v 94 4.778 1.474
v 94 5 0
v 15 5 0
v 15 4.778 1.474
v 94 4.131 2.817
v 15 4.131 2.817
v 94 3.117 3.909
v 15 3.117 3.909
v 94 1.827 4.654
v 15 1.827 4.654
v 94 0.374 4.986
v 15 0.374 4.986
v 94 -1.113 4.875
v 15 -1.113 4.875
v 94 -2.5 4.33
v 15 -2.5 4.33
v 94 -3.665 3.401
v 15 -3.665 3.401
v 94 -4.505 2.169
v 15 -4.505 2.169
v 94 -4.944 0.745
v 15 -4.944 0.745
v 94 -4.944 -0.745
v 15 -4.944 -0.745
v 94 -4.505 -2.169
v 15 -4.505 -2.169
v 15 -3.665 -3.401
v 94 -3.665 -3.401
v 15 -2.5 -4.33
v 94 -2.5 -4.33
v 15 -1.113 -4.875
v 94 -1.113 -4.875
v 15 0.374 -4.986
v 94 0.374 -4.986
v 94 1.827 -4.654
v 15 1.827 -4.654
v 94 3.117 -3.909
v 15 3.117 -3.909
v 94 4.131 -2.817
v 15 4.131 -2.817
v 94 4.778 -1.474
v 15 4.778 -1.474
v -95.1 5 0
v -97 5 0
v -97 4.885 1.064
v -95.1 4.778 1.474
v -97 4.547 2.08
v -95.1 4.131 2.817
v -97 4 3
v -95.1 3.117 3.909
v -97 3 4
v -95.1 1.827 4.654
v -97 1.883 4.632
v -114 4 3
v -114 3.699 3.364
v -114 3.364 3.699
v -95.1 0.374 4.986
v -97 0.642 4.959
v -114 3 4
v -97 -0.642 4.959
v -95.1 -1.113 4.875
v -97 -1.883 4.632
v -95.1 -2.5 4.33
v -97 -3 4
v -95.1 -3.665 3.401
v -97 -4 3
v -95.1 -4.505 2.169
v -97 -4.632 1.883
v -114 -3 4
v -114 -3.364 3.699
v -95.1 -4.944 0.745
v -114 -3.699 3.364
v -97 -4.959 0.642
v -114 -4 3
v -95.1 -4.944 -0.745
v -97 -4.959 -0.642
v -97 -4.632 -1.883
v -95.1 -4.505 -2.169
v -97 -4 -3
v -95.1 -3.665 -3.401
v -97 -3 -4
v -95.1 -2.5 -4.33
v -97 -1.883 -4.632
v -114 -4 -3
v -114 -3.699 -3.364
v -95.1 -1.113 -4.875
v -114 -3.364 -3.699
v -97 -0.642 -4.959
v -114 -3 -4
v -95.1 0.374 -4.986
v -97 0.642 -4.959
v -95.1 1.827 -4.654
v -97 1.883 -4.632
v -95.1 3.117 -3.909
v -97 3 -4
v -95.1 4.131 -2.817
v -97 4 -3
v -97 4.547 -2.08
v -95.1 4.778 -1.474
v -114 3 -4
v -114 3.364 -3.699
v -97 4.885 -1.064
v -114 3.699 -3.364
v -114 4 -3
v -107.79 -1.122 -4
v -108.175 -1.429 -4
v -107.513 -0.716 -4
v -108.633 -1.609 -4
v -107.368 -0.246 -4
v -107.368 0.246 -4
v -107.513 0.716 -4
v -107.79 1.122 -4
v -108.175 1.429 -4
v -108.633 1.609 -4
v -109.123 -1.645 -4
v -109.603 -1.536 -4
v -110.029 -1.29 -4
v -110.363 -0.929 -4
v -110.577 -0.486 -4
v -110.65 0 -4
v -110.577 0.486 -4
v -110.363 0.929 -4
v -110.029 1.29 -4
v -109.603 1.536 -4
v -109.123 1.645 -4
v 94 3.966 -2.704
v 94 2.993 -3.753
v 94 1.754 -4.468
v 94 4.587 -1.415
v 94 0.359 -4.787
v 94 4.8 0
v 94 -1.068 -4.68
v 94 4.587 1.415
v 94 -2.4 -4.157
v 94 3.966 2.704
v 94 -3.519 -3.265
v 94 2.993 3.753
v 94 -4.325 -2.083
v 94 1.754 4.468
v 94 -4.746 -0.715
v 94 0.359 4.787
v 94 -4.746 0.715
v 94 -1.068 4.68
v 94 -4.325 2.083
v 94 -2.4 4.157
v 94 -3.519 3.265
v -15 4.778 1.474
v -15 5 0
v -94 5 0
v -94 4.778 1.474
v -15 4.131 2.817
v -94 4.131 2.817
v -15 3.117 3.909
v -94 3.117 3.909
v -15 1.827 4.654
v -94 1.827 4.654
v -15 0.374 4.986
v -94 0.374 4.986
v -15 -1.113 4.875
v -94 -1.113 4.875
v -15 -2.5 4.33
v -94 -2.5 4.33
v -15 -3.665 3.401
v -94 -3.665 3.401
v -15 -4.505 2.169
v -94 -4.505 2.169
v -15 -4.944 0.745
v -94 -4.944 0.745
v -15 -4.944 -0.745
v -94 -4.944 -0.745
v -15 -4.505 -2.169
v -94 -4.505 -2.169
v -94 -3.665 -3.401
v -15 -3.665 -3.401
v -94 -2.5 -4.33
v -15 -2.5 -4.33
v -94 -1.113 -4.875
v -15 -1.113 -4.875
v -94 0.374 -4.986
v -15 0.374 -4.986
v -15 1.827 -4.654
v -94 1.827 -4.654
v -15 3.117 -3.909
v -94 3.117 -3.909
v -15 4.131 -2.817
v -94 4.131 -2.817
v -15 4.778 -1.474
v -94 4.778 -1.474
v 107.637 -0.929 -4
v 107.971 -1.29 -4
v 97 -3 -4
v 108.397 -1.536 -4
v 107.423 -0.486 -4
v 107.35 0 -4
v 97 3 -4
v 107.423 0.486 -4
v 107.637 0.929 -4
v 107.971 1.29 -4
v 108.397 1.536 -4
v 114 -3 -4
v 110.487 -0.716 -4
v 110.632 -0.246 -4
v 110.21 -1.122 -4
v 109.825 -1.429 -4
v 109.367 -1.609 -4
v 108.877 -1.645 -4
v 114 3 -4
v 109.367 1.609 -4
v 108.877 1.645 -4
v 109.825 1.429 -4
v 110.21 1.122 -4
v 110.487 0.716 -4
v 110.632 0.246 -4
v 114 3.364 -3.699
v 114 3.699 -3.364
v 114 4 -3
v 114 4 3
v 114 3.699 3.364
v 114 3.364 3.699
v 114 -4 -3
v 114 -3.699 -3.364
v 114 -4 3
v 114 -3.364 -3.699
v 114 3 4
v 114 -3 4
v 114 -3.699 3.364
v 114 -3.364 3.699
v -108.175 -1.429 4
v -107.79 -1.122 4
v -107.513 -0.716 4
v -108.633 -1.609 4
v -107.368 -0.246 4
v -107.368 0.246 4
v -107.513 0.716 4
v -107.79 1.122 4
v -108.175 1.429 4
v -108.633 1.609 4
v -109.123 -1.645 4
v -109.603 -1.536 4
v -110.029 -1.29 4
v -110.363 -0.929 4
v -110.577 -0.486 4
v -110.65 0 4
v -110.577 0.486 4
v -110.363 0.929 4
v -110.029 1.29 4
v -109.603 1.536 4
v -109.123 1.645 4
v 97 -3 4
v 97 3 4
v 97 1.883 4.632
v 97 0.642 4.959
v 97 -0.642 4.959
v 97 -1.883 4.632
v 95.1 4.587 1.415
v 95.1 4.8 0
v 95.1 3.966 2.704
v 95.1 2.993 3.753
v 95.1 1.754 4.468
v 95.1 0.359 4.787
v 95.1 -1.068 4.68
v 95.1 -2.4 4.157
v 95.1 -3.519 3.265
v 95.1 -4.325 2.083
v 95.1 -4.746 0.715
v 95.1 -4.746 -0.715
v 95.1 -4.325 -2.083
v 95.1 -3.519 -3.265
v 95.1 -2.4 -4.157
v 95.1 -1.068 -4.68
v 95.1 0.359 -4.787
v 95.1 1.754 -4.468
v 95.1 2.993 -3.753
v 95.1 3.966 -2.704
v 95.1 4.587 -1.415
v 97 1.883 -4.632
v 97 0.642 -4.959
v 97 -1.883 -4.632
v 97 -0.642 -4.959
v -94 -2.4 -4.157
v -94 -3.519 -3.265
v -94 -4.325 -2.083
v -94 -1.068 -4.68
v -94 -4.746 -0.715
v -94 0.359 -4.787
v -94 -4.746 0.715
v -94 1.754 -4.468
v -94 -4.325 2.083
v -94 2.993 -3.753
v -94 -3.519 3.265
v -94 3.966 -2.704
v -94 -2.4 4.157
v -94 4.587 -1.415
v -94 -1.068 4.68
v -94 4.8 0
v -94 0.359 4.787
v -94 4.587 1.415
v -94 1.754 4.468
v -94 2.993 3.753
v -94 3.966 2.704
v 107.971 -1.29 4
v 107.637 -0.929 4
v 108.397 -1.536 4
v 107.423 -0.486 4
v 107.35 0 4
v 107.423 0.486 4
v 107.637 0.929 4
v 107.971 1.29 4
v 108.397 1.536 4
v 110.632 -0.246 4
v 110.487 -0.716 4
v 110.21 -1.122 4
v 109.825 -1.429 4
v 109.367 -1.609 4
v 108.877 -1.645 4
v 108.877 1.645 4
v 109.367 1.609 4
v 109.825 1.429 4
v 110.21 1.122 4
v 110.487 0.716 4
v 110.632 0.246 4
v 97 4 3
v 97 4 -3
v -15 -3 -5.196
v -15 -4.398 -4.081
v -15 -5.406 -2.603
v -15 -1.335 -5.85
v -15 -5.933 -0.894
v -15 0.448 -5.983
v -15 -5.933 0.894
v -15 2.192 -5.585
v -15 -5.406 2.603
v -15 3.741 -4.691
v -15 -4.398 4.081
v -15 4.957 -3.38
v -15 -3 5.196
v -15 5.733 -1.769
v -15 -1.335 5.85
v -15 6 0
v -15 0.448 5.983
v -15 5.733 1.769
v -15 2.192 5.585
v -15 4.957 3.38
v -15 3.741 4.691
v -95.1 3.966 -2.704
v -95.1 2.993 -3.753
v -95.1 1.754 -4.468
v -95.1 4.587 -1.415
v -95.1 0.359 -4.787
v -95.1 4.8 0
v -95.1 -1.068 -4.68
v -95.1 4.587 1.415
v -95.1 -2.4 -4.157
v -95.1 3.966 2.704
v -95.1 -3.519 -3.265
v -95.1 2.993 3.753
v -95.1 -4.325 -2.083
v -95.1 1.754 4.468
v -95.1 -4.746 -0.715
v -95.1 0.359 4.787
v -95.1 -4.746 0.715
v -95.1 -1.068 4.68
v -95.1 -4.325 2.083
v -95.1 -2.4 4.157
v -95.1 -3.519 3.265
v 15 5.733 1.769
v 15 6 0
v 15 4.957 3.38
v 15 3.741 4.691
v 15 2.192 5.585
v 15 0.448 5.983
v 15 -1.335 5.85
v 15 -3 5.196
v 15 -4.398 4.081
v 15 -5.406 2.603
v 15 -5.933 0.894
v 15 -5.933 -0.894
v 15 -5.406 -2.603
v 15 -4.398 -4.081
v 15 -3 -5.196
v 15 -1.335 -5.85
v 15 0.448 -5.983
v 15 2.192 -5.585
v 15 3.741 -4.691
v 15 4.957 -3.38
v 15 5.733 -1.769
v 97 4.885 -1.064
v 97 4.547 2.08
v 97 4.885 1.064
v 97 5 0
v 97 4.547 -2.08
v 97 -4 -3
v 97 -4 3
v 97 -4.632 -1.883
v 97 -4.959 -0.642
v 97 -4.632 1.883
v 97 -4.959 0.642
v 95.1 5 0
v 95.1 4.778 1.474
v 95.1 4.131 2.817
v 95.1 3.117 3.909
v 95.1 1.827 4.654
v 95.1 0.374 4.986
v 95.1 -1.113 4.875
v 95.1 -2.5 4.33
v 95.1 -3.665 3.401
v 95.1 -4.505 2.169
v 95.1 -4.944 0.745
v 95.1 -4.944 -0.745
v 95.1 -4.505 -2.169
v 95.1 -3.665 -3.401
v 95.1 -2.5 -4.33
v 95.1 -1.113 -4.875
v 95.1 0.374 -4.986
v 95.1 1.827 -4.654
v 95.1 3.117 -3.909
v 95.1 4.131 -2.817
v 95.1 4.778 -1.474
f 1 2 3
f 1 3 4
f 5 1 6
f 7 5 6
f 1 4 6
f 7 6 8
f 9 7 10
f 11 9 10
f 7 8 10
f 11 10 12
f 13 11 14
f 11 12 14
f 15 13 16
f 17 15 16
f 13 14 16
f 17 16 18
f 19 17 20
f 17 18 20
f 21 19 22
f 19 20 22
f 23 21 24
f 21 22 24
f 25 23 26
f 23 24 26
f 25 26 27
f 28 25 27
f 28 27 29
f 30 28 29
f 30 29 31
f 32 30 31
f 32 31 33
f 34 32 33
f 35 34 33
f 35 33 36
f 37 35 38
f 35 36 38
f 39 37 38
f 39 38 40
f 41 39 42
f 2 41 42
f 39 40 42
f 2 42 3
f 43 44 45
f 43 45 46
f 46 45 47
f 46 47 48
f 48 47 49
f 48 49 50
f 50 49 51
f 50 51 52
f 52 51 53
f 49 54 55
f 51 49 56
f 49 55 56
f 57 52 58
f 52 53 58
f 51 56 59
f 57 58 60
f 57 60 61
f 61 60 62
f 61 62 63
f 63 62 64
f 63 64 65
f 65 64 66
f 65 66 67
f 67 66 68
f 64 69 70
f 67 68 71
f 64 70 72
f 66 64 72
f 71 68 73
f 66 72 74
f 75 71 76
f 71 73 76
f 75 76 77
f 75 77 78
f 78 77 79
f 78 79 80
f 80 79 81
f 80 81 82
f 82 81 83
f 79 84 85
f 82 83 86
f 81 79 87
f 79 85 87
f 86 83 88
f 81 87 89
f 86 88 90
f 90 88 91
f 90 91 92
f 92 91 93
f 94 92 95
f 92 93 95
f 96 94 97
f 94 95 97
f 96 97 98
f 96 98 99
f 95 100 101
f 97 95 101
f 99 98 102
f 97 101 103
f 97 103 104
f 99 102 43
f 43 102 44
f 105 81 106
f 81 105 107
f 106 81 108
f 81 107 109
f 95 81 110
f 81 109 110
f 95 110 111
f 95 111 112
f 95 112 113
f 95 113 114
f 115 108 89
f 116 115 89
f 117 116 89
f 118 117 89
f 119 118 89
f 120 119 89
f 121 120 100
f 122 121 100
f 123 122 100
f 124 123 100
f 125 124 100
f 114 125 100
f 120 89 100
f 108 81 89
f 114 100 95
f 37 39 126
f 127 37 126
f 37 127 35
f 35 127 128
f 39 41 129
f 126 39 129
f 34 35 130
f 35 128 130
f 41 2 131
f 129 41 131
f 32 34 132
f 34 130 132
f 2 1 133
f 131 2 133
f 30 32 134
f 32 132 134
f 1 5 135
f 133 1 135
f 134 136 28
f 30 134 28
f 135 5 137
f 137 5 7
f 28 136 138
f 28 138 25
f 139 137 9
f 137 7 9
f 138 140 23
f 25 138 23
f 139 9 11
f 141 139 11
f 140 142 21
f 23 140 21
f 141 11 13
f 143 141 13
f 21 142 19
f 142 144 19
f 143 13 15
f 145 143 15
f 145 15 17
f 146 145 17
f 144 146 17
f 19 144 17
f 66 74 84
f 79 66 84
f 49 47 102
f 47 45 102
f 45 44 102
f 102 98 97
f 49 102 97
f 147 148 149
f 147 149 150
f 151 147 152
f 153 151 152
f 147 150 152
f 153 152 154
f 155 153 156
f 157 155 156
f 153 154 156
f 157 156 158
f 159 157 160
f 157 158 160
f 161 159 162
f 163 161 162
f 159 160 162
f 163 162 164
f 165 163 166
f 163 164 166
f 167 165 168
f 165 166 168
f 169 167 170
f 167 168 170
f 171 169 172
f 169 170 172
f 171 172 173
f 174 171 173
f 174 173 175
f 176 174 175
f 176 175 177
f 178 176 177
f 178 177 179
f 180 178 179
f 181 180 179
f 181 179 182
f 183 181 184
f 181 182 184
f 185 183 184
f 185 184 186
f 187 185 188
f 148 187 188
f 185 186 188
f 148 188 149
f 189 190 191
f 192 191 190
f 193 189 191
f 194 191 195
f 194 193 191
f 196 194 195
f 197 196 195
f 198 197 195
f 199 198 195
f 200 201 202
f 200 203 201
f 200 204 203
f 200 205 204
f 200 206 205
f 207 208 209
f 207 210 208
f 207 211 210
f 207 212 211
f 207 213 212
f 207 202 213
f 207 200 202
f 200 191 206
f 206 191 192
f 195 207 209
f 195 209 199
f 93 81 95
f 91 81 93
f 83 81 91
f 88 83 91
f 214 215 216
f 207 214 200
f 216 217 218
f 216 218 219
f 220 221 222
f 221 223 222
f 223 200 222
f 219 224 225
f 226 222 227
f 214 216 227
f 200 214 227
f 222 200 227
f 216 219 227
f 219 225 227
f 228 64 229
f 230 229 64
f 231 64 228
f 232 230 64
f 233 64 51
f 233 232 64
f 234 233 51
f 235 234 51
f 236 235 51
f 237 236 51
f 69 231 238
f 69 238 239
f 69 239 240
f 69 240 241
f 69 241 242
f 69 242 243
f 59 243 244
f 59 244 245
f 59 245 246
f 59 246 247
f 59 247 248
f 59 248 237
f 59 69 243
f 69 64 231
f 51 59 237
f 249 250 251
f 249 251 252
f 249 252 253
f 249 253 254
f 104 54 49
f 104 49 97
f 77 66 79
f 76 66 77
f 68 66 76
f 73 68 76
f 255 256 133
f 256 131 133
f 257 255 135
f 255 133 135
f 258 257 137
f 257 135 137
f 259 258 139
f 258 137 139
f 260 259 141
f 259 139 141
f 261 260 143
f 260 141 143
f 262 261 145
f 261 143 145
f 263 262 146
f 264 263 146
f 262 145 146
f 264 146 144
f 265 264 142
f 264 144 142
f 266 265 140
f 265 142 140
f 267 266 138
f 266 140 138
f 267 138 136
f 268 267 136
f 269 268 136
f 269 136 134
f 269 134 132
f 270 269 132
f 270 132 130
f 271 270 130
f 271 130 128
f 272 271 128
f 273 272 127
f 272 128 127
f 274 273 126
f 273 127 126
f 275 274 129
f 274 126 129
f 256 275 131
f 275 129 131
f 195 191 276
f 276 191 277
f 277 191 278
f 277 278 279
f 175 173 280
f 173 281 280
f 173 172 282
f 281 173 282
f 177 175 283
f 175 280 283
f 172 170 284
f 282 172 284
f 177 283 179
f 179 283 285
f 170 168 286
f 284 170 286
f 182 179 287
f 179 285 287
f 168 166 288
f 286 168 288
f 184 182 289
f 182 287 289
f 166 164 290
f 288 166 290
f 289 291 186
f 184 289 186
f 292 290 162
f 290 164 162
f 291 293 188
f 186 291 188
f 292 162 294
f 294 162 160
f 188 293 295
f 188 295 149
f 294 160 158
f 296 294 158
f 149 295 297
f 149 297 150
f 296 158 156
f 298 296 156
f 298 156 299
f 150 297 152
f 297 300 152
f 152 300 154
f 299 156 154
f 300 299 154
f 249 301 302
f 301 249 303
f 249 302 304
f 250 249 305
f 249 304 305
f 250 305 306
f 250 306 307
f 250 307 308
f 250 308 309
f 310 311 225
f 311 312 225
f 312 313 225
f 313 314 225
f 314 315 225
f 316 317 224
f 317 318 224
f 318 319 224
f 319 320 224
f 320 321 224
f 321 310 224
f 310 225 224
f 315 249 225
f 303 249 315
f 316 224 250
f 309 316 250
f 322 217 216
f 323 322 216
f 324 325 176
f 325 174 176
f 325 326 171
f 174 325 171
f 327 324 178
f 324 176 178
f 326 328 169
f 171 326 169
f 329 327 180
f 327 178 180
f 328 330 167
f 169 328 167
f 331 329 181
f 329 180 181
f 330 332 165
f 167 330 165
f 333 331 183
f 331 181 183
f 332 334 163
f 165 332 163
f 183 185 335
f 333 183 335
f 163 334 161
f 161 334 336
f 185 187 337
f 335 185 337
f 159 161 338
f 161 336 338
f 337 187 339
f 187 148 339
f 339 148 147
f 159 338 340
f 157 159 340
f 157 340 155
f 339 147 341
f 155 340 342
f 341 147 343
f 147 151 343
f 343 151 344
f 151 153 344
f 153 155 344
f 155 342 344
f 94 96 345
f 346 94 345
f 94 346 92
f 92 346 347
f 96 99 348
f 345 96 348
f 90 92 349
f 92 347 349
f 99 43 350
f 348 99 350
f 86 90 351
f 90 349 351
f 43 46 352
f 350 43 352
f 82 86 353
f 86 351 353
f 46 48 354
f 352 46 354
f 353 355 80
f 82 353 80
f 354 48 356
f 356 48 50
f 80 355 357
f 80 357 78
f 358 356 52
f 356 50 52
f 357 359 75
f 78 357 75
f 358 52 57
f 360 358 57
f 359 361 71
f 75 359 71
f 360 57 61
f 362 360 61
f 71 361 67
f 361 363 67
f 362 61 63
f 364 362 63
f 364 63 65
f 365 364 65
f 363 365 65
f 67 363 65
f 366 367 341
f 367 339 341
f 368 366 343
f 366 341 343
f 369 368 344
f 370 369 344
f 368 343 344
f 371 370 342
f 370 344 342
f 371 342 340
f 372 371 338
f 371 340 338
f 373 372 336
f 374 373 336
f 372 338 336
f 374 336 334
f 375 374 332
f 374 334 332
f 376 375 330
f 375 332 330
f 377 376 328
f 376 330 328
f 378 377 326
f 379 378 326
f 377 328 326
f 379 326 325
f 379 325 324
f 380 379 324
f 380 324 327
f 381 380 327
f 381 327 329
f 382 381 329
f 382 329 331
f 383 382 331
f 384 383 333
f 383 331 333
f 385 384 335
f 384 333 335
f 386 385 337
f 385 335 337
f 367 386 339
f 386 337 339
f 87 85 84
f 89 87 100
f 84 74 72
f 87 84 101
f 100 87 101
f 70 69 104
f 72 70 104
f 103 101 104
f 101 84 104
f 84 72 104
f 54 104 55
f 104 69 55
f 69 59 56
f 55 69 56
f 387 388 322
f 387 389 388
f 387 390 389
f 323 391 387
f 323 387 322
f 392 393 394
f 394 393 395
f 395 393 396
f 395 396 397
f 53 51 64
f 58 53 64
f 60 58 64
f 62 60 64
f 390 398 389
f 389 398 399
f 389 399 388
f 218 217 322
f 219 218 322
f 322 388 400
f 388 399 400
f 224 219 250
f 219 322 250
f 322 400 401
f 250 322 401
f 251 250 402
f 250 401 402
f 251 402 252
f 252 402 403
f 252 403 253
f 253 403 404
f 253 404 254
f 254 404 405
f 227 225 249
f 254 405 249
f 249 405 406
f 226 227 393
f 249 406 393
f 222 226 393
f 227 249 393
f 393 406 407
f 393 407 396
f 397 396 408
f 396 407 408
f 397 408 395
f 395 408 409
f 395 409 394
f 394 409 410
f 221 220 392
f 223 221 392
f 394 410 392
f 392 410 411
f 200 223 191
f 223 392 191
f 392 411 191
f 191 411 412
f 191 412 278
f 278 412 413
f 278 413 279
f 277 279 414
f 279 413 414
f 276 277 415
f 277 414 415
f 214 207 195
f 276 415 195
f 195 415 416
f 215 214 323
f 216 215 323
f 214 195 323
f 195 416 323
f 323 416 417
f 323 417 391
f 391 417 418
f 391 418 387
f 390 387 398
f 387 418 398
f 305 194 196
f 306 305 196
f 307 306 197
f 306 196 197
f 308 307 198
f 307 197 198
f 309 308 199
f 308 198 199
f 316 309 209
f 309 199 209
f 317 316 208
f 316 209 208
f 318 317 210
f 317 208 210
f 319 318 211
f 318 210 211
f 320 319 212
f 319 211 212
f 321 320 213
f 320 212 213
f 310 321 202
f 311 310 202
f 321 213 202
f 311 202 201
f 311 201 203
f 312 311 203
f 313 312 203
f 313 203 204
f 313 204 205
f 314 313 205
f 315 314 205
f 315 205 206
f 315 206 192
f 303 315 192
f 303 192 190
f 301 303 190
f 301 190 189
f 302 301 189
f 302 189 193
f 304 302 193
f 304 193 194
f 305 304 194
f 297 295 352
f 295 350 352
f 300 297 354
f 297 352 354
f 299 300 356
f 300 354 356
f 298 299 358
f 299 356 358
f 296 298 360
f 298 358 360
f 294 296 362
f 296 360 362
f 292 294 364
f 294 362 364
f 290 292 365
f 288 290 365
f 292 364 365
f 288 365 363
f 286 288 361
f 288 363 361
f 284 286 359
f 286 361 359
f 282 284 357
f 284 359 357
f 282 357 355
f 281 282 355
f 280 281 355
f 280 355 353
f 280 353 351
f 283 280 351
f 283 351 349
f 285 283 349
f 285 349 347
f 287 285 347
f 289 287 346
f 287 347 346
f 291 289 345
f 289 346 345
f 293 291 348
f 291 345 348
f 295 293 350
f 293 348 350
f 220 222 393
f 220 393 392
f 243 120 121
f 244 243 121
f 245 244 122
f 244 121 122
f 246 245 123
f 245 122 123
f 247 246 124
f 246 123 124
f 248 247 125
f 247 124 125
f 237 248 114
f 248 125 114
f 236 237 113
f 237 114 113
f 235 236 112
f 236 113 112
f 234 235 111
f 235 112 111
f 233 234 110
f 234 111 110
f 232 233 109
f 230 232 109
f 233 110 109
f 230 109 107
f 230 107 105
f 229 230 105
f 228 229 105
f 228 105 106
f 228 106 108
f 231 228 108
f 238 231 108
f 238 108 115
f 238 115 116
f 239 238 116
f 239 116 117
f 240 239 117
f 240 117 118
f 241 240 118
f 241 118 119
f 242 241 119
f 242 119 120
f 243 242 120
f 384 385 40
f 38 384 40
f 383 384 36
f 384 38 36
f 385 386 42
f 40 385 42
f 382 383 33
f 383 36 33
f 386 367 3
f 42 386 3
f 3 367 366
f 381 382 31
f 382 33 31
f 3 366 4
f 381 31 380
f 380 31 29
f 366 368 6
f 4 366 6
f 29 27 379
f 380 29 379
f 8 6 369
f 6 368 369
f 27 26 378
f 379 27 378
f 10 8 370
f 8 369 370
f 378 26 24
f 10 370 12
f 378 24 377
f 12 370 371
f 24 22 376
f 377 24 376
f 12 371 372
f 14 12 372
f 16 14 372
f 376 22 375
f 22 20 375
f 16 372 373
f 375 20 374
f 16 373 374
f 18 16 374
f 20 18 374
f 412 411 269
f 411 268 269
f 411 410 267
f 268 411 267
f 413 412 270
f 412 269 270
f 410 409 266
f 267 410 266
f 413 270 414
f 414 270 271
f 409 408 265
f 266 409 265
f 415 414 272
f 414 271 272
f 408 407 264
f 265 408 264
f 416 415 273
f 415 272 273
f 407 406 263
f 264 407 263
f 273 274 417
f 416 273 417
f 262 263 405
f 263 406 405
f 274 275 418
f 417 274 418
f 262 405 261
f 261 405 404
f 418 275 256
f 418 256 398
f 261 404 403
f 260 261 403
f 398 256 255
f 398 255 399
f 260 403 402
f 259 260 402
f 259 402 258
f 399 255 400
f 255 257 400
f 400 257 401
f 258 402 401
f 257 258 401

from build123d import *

# Parameters (mm, degrees)
SKETCH_2_OUTSIDE_W   = 59.726
SKETCH_2_OUTSIDE_H   = 59.726
SKETCH_2_OUTSIDE_W_2 = 8
SKETCH_2_OUTSIDE_H_2 = 8
CUT_EXTRUDE_1_DEPTH  = 17
HOLE_WIZARD_M4_1_D   = 3.3


with BuildPart() as part:
    # 草图1 → 旋转1 (revolve)
    with BuildSketch(Plane.XY):
        Polygon((114, 0), (114, 5), (95.1, 5), (95.1, 4.8), (94, 4.8), (94, 5), (15, 5), (15, 6), (-15, 6), (-15, 5), (-94, 5), (-94, 4.8), (-95.1, 4.8), (-95.1, 5), (-114, 5), (-114, 0), align=None)
    revolve(axis=Axis((-114, 0, 0), (1, 0, 0)))

    # 草图2 outside → 切除-拉伸1 (cut)
    with BuildSketch(Plane(origin=(114, 0, 0), x_dir=(0, 0, -1), z_dir=(1, 0, 0))):
        Rectangle(SKETCH_2_OUTSIDE_W, SKETCH_2_OUTSIDE_H)
        Rectangle(SKETCH_2_OUTSIDE_W_2, SKETCH_2_OUTSIDE_H_2, mode=Mode.SUBTRACT)
    cut_extrude_1 = extrude(amount=-CUT_EXTRUDE_1_DEPTH, mode=Mode.SUBTRACT)

    # 镜向2: 切除-拉伸1 across plane
    add(cut_extrude_1.mirror(Plane(origin=(0, 0, 0), x_dir=(0, 0, 1), z_dir=(1, 0, 0))), mode=Mode.SUBTRACT)

    # M4 螺纹孔1 (through all)
    with Locations(Plane.XY.offset(4)):
        with Locations((109, 0), (-109, 0)):
            Hole(HOLE_WIZARD_M4_1_D / 2)


solid = part.part
